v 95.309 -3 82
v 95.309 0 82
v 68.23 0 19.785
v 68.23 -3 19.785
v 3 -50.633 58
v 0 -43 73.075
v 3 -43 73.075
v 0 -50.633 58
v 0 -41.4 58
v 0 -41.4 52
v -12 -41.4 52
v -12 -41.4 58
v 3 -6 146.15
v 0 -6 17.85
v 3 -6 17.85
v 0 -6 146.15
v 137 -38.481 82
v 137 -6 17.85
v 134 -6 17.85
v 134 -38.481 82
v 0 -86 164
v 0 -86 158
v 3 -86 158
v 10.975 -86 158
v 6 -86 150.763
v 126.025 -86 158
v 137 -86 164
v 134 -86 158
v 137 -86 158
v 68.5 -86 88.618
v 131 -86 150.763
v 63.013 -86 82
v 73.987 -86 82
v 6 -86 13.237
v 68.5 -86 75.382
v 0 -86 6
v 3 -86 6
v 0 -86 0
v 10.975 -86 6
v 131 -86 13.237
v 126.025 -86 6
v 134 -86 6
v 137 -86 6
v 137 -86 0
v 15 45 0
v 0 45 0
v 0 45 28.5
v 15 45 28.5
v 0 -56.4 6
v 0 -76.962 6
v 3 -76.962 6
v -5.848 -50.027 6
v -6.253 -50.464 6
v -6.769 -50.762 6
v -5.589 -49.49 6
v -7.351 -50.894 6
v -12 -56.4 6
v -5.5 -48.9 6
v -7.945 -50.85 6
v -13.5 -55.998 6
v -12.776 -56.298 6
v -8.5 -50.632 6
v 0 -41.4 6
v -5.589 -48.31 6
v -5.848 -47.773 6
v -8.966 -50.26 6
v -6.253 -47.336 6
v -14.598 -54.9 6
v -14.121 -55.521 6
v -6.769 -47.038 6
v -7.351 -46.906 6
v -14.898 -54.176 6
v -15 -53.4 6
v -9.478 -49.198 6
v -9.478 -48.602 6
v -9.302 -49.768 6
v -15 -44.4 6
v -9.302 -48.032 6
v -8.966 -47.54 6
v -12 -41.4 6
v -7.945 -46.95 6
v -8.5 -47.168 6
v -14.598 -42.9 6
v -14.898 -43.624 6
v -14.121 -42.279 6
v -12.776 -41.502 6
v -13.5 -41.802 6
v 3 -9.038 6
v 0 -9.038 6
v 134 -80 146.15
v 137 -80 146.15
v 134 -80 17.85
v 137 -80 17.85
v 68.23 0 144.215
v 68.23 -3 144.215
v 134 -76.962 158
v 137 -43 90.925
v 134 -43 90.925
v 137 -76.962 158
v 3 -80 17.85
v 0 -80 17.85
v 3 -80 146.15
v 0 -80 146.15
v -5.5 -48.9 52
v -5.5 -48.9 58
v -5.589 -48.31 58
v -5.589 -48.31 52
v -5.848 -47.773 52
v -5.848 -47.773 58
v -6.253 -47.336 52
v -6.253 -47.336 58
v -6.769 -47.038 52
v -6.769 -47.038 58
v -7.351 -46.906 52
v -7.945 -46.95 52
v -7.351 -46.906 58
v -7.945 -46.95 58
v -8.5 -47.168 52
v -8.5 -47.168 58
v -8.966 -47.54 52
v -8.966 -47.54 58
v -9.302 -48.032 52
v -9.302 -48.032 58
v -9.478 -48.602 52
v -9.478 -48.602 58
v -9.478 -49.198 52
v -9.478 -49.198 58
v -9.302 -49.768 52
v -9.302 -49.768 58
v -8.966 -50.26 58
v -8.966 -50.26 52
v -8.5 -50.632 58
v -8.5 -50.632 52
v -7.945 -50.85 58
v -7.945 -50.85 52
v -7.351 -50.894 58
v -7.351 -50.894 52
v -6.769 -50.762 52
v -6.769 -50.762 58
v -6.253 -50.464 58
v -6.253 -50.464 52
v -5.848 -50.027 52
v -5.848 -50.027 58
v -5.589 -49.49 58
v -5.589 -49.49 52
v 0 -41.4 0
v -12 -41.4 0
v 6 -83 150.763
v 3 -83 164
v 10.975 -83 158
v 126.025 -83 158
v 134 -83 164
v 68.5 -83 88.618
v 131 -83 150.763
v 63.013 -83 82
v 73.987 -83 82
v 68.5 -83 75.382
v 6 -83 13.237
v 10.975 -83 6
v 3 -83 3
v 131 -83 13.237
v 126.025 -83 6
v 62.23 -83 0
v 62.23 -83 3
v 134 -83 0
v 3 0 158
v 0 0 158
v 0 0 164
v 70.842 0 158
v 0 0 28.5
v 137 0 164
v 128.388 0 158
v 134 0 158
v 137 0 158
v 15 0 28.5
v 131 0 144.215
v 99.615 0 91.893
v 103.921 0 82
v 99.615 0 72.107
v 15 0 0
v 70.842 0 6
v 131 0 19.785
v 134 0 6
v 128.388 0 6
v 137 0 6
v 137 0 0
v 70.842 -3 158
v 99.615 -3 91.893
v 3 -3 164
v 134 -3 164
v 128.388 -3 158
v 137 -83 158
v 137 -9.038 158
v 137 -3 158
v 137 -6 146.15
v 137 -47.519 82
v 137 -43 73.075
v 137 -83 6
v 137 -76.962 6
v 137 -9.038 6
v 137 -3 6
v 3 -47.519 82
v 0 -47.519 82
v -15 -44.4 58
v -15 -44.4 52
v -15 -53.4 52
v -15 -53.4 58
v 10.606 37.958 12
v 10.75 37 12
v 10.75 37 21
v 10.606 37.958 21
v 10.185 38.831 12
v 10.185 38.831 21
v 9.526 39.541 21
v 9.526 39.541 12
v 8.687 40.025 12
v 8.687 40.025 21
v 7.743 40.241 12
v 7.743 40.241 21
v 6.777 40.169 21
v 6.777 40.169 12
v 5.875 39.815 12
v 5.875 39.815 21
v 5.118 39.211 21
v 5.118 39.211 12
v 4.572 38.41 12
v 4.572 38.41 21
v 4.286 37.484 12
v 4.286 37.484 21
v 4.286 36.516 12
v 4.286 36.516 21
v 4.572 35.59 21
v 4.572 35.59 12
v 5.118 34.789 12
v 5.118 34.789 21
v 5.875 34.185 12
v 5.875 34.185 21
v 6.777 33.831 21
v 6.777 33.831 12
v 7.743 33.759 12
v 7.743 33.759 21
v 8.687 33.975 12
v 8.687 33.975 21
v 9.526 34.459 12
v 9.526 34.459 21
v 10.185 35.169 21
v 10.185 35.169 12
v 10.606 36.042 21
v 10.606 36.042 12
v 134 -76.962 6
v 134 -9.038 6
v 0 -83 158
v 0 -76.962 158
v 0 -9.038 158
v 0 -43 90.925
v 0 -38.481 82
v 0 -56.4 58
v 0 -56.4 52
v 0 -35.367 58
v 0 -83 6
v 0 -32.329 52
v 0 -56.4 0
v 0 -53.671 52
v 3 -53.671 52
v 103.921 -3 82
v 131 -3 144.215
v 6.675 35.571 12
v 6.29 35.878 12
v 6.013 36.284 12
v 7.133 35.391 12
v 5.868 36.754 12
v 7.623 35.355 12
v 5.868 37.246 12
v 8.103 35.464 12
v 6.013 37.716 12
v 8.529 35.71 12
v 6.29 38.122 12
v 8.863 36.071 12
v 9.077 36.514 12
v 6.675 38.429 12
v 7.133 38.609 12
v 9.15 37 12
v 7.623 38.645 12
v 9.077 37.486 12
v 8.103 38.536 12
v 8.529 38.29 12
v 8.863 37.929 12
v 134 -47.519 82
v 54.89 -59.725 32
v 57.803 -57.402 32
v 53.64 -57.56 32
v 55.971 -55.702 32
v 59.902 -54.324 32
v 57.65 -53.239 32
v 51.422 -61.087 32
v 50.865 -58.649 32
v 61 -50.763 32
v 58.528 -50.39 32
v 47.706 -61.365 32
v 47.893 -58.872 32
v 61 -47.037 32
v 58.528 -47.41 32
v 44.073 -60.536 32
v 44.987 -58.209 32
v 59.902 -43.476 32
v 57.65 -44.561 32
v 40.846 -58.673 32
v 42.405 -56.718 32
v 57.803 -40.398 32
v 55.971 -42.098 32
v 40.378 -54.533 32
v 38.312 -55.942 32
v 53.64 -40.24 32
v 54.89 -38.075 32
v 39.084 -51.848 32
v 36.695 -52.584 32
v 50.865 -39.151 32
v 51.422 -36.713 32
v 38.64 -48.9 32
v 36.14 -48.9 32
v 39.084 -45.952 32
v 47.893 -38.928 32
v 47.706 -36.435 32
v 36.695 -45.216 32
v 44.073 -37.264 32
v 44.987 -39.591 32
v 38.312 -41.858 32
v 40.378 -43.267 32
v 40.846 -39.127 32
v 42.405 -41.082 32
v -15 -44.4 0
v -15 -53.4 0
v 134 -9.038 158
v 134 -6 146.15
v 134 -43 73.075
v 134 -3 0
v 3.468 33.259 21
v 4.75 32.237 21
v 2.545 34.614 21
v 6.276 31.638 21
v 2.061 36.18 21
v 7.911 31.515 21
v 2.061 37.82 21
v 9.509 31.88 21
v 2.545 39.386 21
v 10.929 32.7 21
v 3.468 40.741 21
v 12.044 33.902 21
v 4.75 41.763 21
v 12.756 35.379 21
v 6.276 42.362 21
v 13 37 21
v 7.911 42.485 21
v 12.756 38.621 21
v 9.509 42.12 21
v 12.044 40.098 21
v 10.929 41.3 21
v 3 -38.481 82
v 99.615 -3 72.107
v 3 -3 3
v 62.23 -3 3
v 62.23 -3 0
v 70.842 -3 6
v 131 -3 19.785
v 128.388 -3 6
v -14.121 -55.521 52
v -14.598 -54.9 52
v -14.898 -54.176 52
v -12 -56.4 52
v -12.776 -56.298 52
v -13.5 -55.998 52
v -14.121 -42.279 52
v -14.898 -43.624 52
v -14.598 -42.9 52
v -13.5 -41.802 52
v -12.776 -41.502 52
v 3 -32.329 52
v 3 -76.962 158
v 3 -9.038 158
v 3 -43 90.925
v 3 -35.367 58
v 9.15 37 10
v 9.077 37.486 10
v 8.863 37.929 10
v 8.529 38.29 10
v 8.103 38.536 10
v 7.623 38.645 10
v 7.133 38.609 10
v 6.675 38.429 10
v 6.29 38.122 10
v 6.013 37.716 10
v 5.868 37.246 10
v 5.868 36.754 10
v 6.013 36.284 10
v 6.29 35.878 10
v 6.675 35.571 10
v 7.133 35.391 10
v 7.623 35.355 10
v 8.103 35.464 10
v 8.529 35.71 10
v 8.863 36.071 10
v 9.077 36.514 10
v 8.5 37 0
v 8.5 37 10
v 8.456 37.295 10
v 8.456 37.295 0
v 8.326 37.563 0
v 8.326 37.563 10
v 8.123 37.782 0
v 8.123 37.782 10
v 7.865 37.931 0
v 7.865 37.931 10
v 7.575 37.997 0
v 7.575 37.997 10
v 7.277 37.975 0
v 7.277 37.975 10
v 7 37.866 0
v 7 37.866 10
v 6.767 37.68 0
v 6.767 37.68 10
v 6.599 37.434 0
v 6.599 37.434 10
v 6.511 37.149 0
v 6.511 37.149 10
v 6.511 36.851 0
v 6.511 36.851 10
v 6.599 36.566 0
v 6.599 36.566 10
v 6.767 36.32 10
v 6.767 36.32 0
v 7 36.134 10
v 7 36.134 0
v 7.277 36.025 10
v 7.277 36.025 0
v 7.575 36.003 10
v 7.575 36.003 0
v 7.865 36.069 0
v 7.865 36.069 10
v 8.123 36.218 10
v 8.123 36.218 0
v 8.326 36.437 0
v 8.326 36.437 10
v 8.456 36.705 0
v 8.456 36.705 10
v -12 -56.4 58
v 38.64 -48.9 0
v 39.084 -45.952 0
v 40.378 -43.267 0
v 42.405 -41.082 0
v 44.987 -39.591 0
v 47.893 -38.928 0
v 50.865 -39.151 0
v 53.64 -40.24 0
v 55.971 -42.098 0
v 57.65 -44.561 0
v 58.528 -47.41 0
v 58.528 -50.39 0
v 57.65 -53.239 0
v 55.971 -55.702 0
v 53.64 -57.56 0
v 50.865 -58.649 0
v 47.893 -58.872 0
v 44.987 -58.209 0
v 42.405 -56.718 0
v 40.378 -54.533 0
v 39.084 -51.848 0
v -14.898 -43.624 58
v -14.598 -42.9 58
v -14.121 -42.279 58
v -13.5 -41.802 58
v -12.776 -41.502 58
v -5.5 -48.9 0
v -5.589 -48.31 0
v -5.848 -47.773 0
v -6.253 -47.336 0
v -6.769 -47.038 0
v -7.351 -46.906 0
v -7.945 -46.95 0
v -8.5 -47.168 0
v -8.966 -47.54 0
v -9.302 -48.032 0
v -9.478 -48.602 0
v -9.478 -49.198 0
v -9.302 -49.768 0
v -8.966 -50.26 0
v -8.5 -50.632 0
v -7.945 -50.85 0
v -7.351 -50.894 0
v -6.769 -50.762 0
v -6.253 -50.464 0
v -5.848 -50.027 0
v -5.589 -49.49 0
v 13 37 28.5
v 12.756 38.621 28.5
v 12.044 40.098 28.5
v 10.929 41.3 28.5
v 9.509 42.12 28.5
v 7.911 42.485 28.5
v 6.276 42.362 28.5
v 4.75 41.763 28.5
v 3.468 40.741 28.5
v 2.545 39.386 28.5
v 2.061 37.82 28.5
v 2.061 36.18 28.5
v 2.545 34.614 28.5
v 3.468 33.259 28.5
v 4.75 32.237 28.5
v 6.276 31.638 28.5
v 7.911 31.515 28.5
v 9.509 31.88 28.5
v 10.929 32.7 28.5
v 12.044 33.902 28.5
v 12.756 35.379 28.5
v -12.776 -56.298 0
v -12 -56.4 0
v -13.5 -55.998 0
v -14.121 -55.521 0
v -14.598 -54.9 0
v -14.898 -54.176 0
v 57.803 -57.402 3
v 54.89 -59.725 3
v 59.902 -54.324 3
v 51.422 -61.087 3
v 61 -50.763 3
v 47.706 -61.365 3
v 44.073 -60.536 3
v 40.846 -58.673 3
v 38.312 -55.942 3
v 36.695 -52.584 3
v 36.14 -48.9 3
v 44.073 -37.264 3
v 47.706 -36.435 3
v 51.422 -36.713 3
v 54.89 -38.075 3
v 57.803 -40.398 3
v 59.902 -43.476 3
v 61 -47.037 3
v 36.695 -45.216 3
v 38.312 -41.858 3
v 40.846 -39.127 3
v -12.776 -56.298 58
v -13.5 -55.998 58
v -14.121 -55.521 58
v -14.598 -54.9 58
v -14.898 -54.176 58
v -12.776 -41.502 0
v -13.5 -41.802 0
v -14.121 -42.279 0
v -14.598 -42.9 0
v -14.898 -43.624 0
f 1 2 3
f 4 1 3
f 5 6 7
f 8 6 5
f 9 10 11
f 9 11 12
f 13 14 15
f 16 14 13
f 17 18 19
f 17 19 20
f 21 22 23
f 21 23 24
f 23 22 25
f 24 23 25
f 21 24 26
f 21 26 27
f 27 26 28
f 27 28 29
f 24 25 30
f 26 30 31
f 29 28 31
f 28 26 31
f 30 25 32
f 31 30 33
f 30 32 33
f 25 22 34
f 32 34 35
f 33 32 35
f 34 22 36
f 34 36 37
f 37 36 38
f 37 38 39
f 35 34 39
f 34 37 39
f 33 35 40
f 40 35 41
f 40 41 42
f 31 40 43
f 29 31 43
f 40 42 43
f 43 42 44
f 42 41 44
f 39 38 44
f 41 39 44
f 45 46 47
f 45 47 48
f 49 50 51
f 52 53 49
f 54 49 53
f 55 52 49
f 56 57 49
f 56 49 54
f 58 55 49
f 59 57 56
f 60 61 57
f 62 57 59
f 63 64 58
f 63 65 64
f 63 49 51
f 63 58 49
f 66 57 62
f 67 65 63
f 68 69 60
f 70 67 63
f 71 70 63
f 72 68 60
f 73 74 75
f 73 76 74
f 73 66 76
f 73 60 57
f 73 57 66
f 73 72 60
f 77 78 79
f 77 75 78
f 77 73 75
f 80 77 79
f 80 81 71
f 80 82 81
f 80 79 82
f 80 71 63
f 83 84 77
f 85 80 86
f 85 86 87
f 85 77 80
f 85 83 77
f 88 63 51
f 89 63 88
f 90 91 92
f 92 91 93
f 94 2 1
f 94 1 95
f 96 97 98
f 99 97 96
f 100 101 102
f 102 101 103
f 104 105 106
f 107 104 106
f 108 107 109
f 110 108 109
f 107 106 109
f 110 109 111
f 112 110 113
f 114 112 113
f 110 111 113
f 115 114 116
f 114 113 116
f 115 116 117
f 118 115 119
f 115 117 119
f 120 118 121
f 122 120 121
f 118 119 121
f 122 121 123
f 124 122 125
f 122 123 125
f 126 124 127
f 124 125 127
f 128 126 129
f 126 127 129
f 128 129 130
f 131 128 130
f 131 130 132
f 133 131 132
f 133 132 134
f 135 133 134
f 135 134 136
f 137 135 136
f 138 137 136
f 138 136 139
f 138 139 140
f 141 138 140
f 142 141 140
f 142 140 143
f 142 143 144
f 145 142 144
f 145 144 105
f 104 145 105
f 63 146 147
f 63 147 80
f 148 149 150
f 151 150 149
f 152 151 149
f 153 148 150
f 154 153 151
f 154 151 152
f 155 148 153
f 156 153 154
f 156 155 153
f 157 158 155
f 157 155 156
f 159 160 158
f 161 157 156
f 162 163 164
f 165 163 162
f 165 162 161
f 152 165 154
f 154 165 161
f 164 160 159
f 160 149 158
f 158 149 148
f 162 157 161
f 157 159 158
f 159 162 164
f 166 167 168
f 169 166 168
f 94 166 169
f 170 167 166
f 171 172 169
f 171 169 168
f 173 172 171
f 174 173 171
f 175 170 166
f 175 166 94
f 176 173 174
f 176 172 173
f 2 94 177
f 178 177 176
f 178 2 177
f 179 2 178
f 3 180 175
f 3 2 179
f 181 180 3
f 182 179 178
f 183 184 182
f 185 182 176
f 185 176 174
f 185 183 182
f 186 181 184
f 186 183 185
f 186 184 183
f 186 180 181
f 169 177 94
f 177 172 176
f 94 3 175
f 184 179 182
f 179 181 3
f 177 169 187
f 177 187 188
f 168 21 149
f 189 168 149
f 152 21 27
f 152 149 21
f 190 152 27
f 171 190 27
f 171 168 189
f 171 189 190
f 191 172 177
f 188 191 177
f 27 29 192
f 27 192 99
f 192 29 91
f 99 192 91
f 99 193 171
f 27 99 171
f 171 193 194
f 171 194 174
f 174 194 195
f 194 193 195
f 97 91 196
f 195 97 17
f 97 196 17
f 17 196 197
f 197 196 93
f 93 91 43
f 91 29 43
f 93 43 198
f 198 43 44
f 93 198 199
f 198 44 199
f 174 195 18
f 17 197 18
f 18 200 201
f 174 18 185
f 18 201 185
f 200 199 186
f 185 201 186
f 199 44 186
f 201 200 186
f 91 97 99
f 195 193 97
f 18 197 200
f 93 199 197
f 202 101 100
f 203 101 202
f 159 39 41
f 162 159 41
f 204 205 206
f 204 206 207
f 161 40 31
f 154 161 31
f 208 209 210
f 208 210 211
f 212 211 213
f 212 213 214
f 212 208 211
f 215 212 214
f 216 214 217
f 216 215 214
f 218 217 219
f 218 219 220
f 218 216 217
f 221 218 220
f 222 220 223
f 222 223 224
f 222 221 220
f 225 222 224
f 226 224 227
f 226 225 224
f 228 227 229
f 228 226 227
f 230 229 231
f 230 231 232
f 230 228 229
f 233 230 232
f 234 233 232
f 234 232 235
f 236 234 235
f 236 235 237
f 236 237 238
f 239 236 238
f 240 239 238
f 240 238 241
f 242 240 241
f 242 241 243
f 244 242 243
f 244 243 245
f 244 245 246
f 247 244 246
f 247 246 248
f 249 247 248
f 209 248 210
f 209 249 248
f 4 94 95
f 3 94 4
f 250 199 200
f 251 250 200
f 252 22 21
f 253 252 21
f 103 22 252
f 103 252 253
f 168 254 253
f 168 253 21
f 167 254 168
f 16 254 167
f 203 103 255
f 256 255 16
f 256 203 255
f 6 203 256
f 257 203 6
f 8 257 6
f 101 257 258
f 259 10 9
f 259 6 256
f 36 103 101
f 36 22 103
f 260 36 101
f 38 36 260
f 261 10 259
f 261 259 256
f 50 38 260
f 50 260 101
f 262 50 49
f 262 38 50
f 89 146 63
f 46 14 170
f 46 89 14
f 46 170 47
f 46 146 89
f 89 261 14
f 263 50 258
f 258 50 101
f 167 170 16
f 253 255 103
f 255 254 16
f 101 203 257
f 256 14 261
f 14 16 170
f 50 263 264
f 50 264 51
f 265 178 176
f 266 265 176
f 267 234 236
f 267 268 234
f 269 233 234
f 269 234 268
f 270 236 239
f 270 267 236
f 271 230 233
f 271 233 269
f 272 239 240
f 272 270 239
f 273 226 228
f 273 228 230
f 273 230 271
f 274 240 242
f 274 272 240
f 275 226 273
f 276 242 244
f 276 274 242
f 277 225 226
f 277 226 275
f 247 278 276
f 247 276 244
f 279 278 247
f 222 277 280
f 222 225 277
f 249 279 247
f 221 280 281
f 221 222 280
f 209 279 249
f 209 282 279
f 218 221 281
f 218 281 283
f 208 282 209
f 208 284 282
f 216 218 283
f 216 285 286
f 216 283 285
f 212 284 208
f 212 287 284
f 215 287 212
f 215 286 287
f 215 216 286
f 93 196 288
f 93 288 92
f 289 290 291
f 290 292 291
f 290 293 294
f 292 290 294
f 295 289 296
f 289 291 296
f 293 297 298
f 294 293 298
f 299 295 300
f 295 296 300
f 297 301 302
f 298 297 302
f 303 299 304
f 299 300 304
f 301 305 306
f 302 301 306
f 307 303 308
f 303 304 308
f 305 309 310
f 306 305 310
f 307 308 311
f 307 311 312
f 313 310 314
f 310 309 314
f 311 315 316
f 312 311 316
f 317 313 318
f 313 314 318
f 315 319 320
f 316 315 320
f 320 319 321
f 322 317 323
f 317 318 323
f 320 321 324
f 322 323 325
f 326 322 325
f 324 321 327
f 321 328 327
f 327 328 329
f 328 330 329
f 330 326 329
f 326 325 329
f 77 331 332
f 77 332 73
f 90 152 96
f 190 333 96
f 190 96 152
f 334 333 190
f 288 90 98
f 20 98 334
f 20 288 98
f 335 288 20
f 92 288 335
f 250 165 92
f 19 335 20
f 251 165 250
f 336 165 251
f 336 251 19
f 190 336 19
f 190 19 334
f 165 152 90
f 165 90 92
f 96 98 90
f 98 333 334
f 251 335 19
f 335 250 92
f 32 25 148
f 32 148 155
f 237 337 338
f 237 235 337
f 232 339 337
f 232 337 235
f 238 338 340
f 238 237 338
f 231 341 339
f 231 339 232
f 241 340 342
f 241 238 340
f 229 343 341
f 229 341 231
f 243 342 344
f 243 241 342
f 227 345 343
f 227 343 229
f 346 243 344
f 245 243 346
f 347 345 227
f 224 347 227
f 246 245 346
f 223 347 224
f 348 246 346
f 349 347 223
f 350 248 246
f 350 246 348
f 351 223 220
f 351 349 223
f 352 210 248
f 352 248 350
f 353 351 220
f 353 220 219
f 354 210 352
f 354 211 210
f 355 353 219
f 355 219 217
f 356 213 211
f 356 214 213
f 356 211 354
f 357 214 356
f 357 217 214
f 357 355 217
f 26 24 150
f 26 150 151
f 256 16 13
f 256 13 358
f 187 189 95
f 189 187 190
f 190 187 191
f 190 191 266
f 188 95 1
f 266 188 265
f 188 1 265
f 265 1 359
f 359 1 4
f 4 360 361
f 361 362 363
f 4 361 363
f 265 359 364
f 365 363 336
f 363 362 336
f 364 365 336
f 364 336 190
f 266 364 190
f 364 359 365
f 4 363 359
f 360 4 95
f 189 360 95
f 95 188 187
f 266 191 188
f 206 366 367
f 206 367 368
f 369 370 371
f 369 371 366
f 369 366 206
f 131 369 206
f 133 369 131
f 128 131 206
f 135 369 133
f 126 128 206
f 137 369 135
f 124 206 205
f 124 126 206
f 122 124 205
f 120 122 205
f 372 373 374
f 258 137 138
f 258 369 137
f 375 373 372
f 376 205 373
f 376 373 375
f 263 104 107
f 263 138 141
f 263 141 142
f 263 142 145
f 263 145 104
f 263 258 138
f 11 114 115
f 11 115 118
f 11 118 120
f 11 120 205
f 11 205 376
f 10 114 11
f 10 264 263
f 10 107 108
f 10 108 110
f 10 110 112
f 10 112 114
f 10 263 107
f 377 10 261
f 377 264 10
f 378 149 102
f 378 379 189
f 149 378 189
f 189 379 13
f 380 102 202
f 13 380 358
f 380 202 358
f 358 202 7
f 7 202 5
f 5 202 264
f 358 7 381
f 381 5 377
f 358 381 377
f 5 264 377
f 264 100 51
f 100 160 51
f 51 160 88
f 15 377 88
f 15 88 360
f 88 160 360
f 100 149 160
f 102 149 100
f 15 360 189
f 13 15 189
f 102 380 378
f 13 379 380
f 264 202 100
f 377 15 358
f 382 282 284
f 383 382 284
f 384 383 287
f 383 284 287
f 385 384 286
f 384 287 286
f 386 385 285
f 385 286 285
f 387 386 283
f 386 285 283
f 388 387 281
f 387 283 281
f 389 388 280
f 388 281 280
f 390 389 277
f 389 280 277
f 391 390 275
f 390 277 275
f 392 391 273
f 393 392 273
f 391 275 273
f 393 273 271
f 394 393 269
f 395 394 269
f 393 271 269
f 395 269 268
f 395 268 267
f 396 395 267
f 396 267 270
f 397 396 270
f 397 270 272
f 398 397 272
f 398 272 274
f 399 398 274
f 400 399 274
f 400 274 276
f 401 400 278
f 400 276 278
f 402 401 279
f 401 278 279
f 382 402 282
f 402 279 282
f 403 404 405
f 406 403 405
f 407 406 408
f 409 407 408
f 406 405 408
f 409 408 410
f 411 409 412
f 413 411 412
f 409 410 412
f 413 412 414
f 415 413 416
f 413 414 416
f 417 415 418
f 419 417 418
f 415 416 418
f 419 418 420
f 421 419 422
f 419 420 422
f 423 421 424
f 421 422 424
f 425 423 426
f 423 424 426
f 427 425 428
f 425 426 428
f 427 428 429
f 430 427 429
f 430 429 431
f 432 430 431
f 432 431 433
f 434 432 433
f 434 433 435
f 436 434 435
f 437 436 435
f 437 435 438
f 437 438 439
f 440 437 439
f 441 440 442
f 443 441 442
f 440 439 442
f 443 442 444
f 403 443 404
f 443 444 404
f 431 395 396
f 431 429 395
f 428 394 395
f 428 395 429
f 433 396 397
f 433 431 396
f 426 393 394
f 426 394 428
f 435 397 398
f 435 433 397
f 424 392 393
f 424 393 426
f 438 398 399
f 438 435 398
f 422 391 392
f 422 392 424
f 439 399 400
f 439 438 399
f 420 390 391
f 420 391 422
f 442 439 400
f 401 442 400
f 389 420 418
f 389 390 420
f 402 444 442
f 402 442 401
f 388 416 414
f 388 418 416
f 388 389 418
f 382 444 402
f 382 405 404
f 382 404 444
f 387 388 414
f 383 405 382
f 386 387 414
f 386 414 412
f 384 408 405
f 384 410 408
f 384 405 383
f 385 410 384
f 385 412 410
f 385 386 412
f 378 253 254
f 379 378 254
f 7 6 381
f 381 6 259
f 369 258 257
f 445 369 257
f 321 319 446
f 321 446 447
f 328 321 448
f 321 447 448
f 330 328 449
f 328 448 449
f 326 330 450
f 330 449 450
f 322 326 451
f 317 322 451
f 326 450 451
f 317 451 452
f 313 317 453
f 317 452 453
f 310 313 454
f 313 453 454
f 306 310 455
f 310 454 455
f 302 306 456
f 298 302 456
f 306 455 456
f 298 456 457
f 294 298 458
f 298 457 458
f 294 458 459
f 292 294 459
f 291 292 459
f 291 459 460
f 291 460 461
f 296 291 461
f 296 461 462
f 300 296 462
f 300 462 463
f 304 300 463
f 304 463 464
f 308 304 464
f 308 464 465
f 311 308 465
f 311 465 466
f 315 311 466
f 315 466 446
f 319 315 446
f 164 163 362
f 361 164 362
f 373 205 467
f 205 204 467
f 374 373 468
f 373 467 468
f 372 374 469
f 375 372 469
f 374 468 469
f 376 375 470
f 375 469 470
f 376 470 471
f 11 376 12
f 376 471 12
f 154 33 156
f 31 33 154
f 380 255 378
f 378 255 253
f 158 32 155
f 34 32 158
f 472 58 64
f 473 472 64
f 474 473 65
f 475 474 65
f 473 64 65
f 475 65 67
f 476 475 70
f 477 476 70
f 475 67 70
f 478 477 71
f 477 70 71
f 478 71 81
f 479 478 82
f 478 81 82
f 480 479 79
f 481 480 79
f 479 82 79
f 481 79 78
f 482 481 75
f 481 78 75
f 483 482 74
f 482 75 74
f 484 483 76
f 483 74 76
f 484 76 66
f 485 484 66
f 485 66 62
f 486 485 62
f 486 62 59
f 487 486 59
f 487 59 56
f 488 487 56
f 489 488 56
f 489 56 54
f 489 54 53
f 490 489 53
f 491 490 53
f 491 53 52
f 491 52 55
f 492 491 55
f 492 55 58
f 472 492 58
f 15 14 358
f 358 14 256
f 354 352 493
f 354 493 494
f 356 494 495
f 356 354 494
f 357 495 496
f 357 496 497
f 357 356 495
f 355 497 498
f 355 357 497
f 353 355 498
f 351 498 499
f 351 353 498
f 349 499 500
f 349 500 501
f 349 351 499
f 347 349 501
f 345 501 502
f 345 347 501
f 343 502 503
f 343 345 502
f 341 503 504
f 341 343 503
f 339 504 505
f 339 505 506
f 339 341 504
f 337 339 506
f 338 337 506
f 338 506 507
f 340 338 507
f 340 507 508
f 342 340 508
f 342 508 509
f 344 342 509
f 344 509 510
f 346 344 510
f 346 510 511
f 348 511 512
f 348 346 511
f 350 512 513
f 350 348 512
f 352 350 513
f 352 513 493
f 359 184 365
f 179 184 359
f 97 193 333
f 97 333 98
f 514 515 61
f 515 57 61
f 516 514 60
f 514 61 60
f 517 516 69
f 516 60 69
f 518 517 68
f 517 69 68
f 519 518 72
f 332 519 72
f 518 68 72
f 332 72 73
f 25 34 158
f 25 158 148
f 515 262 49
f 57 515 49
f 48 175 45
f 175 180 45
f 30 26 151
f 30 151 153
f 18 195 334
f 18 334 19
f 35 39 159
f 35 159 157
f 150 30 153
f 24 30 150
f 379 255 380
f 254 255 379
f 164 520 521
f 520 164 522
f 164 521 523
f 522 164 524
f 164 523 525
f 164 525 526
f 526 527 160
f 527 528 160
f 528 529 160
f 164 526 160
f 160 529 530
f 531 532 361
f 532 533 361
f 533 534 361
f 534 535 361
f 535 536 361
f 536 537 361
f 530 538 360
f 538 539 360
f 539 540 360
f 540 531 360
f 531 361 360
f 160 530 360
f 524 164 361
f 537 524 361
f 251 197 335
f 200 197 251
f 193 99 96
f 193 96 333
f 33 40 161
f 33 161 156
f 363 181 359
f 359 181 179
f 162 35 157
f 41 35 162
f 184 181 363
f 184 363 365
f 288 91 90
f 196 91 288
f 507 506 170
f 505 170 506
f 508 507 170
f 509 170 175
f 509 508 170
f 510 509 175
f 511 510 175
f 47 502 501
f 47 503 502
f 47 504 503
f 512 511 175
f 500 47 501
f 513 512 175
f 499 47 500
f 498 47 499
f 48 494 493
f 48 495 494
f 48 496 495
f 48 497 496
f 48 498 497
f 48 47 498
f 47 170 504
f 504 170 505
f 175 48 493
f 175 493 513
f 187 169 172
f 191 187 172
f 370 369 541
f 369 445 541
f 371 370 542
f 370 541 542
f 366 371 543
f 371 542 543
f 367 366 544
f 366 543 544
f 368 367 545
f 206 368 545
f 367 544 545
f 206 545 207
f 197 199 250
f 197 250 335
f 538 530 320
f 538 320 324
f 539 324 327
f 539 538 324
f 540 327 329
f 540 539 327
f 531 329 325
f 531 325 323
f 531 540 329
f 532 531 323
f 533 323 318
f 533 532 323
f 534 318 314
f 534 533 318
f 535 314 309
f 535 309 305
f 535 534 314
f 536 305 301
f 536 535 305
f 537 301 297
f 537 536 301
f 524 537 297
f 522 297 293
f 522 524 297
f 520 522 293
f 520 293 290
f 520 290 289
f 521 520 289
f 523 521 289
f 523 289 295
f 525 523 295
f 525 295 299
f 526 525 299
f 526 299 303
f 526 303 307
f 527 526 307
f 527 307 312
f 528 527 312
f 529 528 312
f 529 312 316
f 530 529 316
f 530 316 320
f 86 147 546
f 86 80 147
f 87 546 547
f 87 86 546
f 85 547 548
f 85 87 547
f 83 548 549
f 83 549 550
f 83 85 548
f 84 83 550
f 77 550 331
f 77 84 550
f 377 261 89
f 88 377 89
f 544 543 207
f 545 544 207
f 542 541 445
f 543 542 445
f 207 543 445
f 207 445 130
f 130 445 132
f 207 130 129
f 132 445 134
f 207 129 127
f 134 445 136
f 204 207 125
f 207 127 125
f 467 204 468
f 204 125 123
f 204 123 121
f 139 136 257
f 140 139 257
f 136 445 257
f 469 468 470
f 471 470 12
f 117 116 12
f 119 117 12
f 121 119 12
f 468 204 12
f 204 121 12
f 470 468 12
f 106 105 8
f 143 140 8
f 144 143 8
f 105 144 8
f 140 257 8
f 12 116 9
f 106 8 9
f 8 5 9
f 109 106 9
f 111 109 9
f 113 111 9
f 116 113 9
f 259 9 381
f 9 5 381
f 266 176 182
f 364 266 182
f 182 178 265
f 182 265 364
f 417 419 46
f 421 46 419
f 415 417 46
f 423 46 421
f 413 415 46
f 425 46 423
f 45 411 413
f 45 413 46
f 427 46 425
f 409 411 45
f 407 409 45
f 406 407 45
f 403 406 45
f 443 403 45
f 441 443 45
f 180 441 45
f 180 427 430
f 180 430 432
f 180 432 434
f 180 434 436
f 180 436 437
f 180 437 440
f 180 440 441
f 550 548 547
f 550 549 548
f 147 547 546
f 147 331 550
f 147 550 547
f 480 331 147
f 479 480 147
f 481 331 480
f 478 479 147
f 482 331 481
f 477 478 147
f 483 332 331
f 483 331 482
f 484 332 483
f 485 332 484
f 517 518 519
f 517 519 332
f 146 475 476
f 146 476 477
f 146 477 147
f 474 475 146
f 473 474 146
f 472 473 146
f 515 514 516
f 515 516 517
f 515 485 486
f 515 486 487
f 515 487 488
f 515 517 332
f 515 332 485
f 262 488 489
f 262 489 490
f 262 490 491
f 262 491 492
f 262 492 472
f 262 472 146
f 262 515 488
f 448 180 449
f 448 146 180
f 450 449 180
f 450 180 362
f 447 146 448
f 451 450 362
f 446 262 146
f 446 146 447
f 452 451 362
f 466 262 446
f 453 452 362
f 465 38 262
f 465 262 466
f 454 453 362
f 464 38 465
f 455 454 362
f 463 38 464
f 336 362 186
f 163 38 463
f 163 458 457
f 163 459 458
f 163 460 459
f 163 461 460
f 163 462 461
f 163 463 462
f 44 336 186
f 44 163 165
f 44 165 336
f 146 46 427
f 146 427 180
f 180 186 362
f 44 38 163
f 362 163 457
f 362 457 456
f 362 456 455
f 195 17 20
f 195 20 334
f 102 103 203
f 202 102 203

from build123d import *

# Parameters (mm, degrees)
SKETCH1_W            = 137
SKETCH1_H            = 86
SKETCH1_W_2          = 131
SKETCH1_H_2          = 80
BOSS_EXTRUDE1_DEPTH  = 164
SKETCH2_W            = 125
SKETCH2_H            = 152
CUT_EXTRUDE1_DEPTH   = 3
BOSS_EXTRUDE2_DEPTH  = 3
BOSS_EXTRUDE3_DEPTH  = 3
SKETCH3_W            = 152
SKETCH3_H            = 74
CUT_EXTRUDE2_DEPTH   = 3
BOSS_EXTRUDE4_DEPTH  = 3
BOSS_EXTRUDE5_DEPTH  = 3
SKETCH4_W            = 152
SKETCH4_H            = 74
CUT_EXTRUDE3_DEPTH   = 3
BOSS_EXTRUDE6_DEPTH  = 3
BOSS_EXTRUDE7_DEPTH  = 3
SKETCH6_W            = 62.23
SKETCH6_H            = 86
BOSS_EXTRUDE8_DEPTH  = 3
SKETCH7_W            = 62.77
SKETCH7_H            = 152
CUT_EXTRUDE4_DEPTH   = 3
BOSS_EXTRUDE9_DEPTH  = 3
BOSS_EXTRUDE10_DEPTH = 3
SKETCH8_R            = 12.5
SKETCH8_R_2          = 10
BOSS_EXTRUDE11_DEPTH = 32
SKETCH8_4_R          = 10
CUT_EXTRUDE8_DEPTH   = 32
SKETCH9_W            = 6
SKETCH9_H            = 15
BOSS_EXTRUDE12_DEPTH = 15
SKETCH9_3_W          = 6
SKETCH9_3_H          = 15
BOSS_EXTRUDE13_DEPTH = 12
SKETCH9_4_W          = 6
SKETCH9_4_H          = 15
BOSS_EXTRUDE14_DEPTH = 15
FILLET1_R            = 3
SKETCH9_5_W          = 6
SKETCH9_5_H          = 28.664942424
BOSS_EXTRUDE17_DEPTH = 3
SKETCH16_R           = 2
CUT_EXTRUDE13_DEPTH  = 64
SKETCH11_W           = 15
SKETCH11_H           = 10
BOSS_EXTRUDE18_DEPTH = 45
SKETCH18_R           = 1
CUT_EXTRUDE14_DEPTH  = 10
SKETCH19_W           = 15
SKETCH19_H           = 45
BOSS_EXTRUDE19_DEPTH = 2
SKETCH20_R           = 1.65
CUT_EXTRUDE15_DEPTH  = 2
SKETCH21_W           = 15
SKETCH21_H           = 45
BOSS_EXTRUDE20_DEPTH = 9
SKETCH21_3_R         = 3.25
CUT_EXTRUDE16_DEPTH  = 9
SKETCH25_W           = 15
SKETCH25_H           = 45
SKETCH25_R           = 5.5
BOSS_EXTRUDE21_DEPTH = 7.5


with BuildPart() as part:
    # Sketch1 → Boss-Extrude1 (new body)
    with BuildSketch(Plane.XY):
        with Locations((68.5, -43)):
            Rectangle(SKETCH1_W, SKETCH1_H)
        with Locations((68.5, -43)):
            Rectangle(SKETCH1_W_2, SKETCH1_H_2, mode=Mode.SUBTRACT)
    extrude(amount=BOSS_EXTRUDE1_DEPTH)

    # Sketch2 → Cut-Extrude1 (cut)
    with BuildSketch(Plane.XZ.offset(86)):
        with Locations((68.5, 82)):
            Rectangle(SKETCH2_W, SKETCH2_H)
    extrude(amount=-CUT_EXTRUDE1_DEPTH, mode=Mode.SUBTRACT)

    # Sketch2<3> → Boss-Extrude2 (add)
    with BuildSketch(Plane.XZ.offset(86)):
        Polygon((0, 158), (131, 0), (137, 6), (6, 164), align=None)
    extrude(amount=-BOSS_EXTRUDE2_DEPTH)

    # Sketch2<4> → Boss-Extrude3 (add)
    with BuildSketch(Plane.XZ.offset(86)):
        Polygon((131, 164), (0, 6), (6, 0), (137, 158), align=None)
    extrude(amount=-BOSS_EXTRUDE3_DEPTH)

    # Sketch3 → Cut-Extrude2 (cut)
    with BuildSketch(Plane(origin=(137, 0, 0), x_dir=(0, 0, -1), z_dir=(1, 0, 0))):
        with Locations((-82, -43)):
            Rectangle(SKETCH3_W, SKETCH3_H)
    extrude(amount=-CUT_EXTRUDE2_DEPTH, mode=Mode.SUBTRACT)

    # Sketch3<3> → Boss-Extrude4 (add)
    with BuildSketch(Plane(origin=(137, 0, 0), x_dir=(0, 0, -1), z_dir=(1, 0, 0))):
        Polygon((-164, -6), (-6, -86), (0, -80), (-158, 0), align=None)
    extrude(amount=-BOSS_EXTRUDE4_DEPTH)

    # Sketch3<5> → Boss-Extrude5 (add)
    with BuildSketch(Plane(origin=(137, 0, 0), x_dir=(0, 0, -1), z_dir=(1, 0, 0))):
        Polygon((-158, -86), (0, -6), (-6, 0), (-164, -80), align=None)
    extrude(amount=-BOSS_EXTRUDE5_DEPTH)

    # Sketch4 → Cut-Extrude3 (cut)
    with BuildSketch(Plane.ZY):
        with Locations((82, -43)):
            Rectangle(SKETCH4_W, SKETCH4_H)
    extrude(amount=-CUT_EXTRUDE3_DEPTH, mode=Mode.SUBTRACT)

    # Sketch4<4> → Boss-Extrude6 (add)
    with BuildSketch(Plane.ZY):
        Polygon((158, 0), (0, -80), (6, -86), (164, -6), align=None)
    extrude(amount=-BOSS_EXTRUDE6_DEPTH)

    # Sketch4<5> → Boss-Extrude7 (add)
    with BuildSketch(Plane.ZY):
        Polygon((6, 0), (164, -80), (158, -86), (0, -6), align=None)
    extrude(amount=-BOSS_EXTRUDE7_DEPTH)

    # Sketch6 → Boss-Extrude8 (add)
    with BuildSketch(Plane(origin=(0, 0, 0), x_dir=(-1, 0, 0), z_dir=(0, 0, -1))):
        with Locations((-31.115, -43)):
            Rectangle(SKETCH6_W, SKETCH6_H)
    extrude(amount=-BOSS_EXTRUDE8_DEPTH)

    # Sketch7 → Cut-Extrude4 (cut)
    with BuildSketch(Plane(origin=(0, 0, 0), x_dir=(1, 0, 0), z_dir=(0, 1, 0))):
        with Locations((99.615, -82)):
            Rectangle(SKETCH7_W, SKETCH7_H)
    extrude(amount=-CUT_EXTRUDE4_DEPTH, mode=Mode.SUBTRACT)

    # Sketch7<3> → Boss-Extrude9 (add)
    with BuildSketch(Plane(origin=(0, 0, 0), x_dir=(1, 0, 0), z_dir=(0, 1, 0))):
        Polygon((68.23, 0), (137, -158), (131, -164), (62.23, -6), align=None)
    extrude(amount=-BOSS_EXTRUDE9_DEPTH)

    # Sketch7<4> → Boss-Extrude10 (add)
    with BuildSketch(Plane(origin=(0, 0, 0), x_dir=(1, 0, 0), z_dir=(0, 1, 0))):
        Polygon((131, 0), (62.23, -158), (68.23, -164), (137, -6), align=None)
    extrude(amount=-BOSS_EXTRUDE10_DEPTH)

    # Sketch8 → Boss-Extrude11 (add)
    with BuildSketch(Plane(origin=(0, 0, 0), x_dir=(-1, 0, 0), z_dir=(0, 0, -1))):
        with Locations((-48.64, -48.9)):
            Circle(SKETCH8_R)
        with Locations((-48.64, -48.9)):
            Circle(SKETCH8_R_2, mode=Mode.SUBTRACT)
    extrude(amount=-BOSS_EXTRUDE11_DEPTH)

    # Sketch8<4> → Cut-Extrude8 (cut)
    with BuildSketch(Plane(origin=(0, 0, 0), x_dir=(-1, 0, 0), z_dir=(0, 0, -1))):
        with Locations((-48.64, -48.9)):
            Circle(SKETCH8_4_R)
    extrude(amount=-CUT_EXTRUDE8_DEPTH, mode=Mode.SUBTRACT)

    # Sketch9 → Boss-Extrude12 (add)
    with BuildSketch(Plane.ZY):
        with Locations((55, -48.9)):
            Rectangle(SKETCH9_W, SKETCH9_H)
    extrude(amount=BOSS_EXTRUDE12_DEPTH)

    # Sketch9<3> → Boss-Extrude13 (add)
    with BuildSketch(Plane.ZY):
        with Locations((55, -48.9)):
            Rectangle(SKETCH9_3_W, SKETCH9_3_H)
    extrude(amount=BOSS_EXTRUDE13_DEPTH)

    # Sketch9<4> → Boss-Extrude14 (add)
    with BuildSketch(Plane.ZY):
        with Locations((3, -48.9)):
            Rectangle(SKETCH9_4_W, SKETCH9_4_H)
    extrude(amount=BOSS_EXTRUDE14_DEPTH)

    # Fillet1
    fillet1_edges = [part.edges().sort_by_distance(p)[0] for p in [
        (-15, -56.4, 55),
        (-15, -41.4, 55),
        (-15, -56.4, 3),
        (-15, -41.4, 3),
    ]]
    fillet(fillet1_edges, radius=FILLET1_R)

    # Sketch9<5> → Boss-Extrude17 (add)
    with BuildSketch(Plane.ZY):
        with Locations((55, -42.711986128)):
            Rectangle(SKETCH9_5_W, SKETCH9_5_H)
    extrude(amount=-BOSS_EXTRUDE17_DEPTH)

    # Sketch16 → Cut-Extrude13 (cut)
    with BuildSketch(Plane.XY.offset(58)):
        with Locations((-7.5, -48.9)):
            Circle(SKETCH16_R)
    extrude(amount=-CUT_EXTRUDE13_DEPTH, mode=Mode.SUBTRACT)

    # Sketch11 → Boss-Extrude18 (add)
    with BuildSketch(Plane(origin=(0, 0, 0), x_dir=(1, 0, 0), z_dir=(0, 1, 0))):
        with Locations((7.5, -5)):
            Rectangle(SKETCH11_W, SKETCH11_H)
    extrude(amount=BOSS_EXTRUDE18_DEPTH)

    # Sketch18 → Cut-Extrude14 (cut)
    with BuildSketch(Plane.XY.offset(10)):
        with Locations((7.5, 37)):
            Circle(SKETCH18_R)
    extrude(amount=-CUT_EXTRUDE14_DEPTH, mode=Mode.SUBTRACT)

    # Sketch19 → Boss-Extrude19 (add)
    with BuildSketch(Plane.XY.offset(10)):
        with Locations((7.5, 22.5)):
            Rectangle(SKETCH19_W, SKETCH19_H)
    extrude(amount=BOSS_EXTRUDE19_DEPTH)

    # Sketch20 → Cut-Extrude15 (cut)
    with BuildSketch(Plane.XY.offset(12)):
        with Locations((7.5, 37)):
            Circle(SKETCH20_R)
    extrude(amount=-CUT_EXTRUDE15_DEPTH, mode=Mode.SUBTRACT)

    # Sketch21 → Boss-Extrude20 (add)
    with BuildSketch(Plane.XY.offset(12)):
        with Locations((7.5, 22.5)):
            Rectangle(SKETCH21_W, SKETCH21_H)
    extrude(amount=BOSS_EXTRUDE20_DEPTH)

    # Sketch21<3> → Cut-Extrude16 (cut)
    with BuildSketch(Plane.XY.offset(12)):
        with Locations((7.5, 37)):
            Circle(SKETCH21_3_R)
    extrude(amount=CUT_EXTRUDE16_DEPTH, mode=Mode.SUBTRACT)

    # Sketch25 → Boss-Extrude21 (add)
    with BuildSketch(Plane.XY.offset(21)):
        with Locations((7.5, 22.5)):
            Rectangle(SKETCH25_W, SKETCH25_H)
        with Locations((7.5, 37)):
            Circle(SKETCH25_R, mode=Mode.SUBTRACT)
    extrude(amount=BOSS_EXTRUDE21_DEPTH)


solid = part.part
